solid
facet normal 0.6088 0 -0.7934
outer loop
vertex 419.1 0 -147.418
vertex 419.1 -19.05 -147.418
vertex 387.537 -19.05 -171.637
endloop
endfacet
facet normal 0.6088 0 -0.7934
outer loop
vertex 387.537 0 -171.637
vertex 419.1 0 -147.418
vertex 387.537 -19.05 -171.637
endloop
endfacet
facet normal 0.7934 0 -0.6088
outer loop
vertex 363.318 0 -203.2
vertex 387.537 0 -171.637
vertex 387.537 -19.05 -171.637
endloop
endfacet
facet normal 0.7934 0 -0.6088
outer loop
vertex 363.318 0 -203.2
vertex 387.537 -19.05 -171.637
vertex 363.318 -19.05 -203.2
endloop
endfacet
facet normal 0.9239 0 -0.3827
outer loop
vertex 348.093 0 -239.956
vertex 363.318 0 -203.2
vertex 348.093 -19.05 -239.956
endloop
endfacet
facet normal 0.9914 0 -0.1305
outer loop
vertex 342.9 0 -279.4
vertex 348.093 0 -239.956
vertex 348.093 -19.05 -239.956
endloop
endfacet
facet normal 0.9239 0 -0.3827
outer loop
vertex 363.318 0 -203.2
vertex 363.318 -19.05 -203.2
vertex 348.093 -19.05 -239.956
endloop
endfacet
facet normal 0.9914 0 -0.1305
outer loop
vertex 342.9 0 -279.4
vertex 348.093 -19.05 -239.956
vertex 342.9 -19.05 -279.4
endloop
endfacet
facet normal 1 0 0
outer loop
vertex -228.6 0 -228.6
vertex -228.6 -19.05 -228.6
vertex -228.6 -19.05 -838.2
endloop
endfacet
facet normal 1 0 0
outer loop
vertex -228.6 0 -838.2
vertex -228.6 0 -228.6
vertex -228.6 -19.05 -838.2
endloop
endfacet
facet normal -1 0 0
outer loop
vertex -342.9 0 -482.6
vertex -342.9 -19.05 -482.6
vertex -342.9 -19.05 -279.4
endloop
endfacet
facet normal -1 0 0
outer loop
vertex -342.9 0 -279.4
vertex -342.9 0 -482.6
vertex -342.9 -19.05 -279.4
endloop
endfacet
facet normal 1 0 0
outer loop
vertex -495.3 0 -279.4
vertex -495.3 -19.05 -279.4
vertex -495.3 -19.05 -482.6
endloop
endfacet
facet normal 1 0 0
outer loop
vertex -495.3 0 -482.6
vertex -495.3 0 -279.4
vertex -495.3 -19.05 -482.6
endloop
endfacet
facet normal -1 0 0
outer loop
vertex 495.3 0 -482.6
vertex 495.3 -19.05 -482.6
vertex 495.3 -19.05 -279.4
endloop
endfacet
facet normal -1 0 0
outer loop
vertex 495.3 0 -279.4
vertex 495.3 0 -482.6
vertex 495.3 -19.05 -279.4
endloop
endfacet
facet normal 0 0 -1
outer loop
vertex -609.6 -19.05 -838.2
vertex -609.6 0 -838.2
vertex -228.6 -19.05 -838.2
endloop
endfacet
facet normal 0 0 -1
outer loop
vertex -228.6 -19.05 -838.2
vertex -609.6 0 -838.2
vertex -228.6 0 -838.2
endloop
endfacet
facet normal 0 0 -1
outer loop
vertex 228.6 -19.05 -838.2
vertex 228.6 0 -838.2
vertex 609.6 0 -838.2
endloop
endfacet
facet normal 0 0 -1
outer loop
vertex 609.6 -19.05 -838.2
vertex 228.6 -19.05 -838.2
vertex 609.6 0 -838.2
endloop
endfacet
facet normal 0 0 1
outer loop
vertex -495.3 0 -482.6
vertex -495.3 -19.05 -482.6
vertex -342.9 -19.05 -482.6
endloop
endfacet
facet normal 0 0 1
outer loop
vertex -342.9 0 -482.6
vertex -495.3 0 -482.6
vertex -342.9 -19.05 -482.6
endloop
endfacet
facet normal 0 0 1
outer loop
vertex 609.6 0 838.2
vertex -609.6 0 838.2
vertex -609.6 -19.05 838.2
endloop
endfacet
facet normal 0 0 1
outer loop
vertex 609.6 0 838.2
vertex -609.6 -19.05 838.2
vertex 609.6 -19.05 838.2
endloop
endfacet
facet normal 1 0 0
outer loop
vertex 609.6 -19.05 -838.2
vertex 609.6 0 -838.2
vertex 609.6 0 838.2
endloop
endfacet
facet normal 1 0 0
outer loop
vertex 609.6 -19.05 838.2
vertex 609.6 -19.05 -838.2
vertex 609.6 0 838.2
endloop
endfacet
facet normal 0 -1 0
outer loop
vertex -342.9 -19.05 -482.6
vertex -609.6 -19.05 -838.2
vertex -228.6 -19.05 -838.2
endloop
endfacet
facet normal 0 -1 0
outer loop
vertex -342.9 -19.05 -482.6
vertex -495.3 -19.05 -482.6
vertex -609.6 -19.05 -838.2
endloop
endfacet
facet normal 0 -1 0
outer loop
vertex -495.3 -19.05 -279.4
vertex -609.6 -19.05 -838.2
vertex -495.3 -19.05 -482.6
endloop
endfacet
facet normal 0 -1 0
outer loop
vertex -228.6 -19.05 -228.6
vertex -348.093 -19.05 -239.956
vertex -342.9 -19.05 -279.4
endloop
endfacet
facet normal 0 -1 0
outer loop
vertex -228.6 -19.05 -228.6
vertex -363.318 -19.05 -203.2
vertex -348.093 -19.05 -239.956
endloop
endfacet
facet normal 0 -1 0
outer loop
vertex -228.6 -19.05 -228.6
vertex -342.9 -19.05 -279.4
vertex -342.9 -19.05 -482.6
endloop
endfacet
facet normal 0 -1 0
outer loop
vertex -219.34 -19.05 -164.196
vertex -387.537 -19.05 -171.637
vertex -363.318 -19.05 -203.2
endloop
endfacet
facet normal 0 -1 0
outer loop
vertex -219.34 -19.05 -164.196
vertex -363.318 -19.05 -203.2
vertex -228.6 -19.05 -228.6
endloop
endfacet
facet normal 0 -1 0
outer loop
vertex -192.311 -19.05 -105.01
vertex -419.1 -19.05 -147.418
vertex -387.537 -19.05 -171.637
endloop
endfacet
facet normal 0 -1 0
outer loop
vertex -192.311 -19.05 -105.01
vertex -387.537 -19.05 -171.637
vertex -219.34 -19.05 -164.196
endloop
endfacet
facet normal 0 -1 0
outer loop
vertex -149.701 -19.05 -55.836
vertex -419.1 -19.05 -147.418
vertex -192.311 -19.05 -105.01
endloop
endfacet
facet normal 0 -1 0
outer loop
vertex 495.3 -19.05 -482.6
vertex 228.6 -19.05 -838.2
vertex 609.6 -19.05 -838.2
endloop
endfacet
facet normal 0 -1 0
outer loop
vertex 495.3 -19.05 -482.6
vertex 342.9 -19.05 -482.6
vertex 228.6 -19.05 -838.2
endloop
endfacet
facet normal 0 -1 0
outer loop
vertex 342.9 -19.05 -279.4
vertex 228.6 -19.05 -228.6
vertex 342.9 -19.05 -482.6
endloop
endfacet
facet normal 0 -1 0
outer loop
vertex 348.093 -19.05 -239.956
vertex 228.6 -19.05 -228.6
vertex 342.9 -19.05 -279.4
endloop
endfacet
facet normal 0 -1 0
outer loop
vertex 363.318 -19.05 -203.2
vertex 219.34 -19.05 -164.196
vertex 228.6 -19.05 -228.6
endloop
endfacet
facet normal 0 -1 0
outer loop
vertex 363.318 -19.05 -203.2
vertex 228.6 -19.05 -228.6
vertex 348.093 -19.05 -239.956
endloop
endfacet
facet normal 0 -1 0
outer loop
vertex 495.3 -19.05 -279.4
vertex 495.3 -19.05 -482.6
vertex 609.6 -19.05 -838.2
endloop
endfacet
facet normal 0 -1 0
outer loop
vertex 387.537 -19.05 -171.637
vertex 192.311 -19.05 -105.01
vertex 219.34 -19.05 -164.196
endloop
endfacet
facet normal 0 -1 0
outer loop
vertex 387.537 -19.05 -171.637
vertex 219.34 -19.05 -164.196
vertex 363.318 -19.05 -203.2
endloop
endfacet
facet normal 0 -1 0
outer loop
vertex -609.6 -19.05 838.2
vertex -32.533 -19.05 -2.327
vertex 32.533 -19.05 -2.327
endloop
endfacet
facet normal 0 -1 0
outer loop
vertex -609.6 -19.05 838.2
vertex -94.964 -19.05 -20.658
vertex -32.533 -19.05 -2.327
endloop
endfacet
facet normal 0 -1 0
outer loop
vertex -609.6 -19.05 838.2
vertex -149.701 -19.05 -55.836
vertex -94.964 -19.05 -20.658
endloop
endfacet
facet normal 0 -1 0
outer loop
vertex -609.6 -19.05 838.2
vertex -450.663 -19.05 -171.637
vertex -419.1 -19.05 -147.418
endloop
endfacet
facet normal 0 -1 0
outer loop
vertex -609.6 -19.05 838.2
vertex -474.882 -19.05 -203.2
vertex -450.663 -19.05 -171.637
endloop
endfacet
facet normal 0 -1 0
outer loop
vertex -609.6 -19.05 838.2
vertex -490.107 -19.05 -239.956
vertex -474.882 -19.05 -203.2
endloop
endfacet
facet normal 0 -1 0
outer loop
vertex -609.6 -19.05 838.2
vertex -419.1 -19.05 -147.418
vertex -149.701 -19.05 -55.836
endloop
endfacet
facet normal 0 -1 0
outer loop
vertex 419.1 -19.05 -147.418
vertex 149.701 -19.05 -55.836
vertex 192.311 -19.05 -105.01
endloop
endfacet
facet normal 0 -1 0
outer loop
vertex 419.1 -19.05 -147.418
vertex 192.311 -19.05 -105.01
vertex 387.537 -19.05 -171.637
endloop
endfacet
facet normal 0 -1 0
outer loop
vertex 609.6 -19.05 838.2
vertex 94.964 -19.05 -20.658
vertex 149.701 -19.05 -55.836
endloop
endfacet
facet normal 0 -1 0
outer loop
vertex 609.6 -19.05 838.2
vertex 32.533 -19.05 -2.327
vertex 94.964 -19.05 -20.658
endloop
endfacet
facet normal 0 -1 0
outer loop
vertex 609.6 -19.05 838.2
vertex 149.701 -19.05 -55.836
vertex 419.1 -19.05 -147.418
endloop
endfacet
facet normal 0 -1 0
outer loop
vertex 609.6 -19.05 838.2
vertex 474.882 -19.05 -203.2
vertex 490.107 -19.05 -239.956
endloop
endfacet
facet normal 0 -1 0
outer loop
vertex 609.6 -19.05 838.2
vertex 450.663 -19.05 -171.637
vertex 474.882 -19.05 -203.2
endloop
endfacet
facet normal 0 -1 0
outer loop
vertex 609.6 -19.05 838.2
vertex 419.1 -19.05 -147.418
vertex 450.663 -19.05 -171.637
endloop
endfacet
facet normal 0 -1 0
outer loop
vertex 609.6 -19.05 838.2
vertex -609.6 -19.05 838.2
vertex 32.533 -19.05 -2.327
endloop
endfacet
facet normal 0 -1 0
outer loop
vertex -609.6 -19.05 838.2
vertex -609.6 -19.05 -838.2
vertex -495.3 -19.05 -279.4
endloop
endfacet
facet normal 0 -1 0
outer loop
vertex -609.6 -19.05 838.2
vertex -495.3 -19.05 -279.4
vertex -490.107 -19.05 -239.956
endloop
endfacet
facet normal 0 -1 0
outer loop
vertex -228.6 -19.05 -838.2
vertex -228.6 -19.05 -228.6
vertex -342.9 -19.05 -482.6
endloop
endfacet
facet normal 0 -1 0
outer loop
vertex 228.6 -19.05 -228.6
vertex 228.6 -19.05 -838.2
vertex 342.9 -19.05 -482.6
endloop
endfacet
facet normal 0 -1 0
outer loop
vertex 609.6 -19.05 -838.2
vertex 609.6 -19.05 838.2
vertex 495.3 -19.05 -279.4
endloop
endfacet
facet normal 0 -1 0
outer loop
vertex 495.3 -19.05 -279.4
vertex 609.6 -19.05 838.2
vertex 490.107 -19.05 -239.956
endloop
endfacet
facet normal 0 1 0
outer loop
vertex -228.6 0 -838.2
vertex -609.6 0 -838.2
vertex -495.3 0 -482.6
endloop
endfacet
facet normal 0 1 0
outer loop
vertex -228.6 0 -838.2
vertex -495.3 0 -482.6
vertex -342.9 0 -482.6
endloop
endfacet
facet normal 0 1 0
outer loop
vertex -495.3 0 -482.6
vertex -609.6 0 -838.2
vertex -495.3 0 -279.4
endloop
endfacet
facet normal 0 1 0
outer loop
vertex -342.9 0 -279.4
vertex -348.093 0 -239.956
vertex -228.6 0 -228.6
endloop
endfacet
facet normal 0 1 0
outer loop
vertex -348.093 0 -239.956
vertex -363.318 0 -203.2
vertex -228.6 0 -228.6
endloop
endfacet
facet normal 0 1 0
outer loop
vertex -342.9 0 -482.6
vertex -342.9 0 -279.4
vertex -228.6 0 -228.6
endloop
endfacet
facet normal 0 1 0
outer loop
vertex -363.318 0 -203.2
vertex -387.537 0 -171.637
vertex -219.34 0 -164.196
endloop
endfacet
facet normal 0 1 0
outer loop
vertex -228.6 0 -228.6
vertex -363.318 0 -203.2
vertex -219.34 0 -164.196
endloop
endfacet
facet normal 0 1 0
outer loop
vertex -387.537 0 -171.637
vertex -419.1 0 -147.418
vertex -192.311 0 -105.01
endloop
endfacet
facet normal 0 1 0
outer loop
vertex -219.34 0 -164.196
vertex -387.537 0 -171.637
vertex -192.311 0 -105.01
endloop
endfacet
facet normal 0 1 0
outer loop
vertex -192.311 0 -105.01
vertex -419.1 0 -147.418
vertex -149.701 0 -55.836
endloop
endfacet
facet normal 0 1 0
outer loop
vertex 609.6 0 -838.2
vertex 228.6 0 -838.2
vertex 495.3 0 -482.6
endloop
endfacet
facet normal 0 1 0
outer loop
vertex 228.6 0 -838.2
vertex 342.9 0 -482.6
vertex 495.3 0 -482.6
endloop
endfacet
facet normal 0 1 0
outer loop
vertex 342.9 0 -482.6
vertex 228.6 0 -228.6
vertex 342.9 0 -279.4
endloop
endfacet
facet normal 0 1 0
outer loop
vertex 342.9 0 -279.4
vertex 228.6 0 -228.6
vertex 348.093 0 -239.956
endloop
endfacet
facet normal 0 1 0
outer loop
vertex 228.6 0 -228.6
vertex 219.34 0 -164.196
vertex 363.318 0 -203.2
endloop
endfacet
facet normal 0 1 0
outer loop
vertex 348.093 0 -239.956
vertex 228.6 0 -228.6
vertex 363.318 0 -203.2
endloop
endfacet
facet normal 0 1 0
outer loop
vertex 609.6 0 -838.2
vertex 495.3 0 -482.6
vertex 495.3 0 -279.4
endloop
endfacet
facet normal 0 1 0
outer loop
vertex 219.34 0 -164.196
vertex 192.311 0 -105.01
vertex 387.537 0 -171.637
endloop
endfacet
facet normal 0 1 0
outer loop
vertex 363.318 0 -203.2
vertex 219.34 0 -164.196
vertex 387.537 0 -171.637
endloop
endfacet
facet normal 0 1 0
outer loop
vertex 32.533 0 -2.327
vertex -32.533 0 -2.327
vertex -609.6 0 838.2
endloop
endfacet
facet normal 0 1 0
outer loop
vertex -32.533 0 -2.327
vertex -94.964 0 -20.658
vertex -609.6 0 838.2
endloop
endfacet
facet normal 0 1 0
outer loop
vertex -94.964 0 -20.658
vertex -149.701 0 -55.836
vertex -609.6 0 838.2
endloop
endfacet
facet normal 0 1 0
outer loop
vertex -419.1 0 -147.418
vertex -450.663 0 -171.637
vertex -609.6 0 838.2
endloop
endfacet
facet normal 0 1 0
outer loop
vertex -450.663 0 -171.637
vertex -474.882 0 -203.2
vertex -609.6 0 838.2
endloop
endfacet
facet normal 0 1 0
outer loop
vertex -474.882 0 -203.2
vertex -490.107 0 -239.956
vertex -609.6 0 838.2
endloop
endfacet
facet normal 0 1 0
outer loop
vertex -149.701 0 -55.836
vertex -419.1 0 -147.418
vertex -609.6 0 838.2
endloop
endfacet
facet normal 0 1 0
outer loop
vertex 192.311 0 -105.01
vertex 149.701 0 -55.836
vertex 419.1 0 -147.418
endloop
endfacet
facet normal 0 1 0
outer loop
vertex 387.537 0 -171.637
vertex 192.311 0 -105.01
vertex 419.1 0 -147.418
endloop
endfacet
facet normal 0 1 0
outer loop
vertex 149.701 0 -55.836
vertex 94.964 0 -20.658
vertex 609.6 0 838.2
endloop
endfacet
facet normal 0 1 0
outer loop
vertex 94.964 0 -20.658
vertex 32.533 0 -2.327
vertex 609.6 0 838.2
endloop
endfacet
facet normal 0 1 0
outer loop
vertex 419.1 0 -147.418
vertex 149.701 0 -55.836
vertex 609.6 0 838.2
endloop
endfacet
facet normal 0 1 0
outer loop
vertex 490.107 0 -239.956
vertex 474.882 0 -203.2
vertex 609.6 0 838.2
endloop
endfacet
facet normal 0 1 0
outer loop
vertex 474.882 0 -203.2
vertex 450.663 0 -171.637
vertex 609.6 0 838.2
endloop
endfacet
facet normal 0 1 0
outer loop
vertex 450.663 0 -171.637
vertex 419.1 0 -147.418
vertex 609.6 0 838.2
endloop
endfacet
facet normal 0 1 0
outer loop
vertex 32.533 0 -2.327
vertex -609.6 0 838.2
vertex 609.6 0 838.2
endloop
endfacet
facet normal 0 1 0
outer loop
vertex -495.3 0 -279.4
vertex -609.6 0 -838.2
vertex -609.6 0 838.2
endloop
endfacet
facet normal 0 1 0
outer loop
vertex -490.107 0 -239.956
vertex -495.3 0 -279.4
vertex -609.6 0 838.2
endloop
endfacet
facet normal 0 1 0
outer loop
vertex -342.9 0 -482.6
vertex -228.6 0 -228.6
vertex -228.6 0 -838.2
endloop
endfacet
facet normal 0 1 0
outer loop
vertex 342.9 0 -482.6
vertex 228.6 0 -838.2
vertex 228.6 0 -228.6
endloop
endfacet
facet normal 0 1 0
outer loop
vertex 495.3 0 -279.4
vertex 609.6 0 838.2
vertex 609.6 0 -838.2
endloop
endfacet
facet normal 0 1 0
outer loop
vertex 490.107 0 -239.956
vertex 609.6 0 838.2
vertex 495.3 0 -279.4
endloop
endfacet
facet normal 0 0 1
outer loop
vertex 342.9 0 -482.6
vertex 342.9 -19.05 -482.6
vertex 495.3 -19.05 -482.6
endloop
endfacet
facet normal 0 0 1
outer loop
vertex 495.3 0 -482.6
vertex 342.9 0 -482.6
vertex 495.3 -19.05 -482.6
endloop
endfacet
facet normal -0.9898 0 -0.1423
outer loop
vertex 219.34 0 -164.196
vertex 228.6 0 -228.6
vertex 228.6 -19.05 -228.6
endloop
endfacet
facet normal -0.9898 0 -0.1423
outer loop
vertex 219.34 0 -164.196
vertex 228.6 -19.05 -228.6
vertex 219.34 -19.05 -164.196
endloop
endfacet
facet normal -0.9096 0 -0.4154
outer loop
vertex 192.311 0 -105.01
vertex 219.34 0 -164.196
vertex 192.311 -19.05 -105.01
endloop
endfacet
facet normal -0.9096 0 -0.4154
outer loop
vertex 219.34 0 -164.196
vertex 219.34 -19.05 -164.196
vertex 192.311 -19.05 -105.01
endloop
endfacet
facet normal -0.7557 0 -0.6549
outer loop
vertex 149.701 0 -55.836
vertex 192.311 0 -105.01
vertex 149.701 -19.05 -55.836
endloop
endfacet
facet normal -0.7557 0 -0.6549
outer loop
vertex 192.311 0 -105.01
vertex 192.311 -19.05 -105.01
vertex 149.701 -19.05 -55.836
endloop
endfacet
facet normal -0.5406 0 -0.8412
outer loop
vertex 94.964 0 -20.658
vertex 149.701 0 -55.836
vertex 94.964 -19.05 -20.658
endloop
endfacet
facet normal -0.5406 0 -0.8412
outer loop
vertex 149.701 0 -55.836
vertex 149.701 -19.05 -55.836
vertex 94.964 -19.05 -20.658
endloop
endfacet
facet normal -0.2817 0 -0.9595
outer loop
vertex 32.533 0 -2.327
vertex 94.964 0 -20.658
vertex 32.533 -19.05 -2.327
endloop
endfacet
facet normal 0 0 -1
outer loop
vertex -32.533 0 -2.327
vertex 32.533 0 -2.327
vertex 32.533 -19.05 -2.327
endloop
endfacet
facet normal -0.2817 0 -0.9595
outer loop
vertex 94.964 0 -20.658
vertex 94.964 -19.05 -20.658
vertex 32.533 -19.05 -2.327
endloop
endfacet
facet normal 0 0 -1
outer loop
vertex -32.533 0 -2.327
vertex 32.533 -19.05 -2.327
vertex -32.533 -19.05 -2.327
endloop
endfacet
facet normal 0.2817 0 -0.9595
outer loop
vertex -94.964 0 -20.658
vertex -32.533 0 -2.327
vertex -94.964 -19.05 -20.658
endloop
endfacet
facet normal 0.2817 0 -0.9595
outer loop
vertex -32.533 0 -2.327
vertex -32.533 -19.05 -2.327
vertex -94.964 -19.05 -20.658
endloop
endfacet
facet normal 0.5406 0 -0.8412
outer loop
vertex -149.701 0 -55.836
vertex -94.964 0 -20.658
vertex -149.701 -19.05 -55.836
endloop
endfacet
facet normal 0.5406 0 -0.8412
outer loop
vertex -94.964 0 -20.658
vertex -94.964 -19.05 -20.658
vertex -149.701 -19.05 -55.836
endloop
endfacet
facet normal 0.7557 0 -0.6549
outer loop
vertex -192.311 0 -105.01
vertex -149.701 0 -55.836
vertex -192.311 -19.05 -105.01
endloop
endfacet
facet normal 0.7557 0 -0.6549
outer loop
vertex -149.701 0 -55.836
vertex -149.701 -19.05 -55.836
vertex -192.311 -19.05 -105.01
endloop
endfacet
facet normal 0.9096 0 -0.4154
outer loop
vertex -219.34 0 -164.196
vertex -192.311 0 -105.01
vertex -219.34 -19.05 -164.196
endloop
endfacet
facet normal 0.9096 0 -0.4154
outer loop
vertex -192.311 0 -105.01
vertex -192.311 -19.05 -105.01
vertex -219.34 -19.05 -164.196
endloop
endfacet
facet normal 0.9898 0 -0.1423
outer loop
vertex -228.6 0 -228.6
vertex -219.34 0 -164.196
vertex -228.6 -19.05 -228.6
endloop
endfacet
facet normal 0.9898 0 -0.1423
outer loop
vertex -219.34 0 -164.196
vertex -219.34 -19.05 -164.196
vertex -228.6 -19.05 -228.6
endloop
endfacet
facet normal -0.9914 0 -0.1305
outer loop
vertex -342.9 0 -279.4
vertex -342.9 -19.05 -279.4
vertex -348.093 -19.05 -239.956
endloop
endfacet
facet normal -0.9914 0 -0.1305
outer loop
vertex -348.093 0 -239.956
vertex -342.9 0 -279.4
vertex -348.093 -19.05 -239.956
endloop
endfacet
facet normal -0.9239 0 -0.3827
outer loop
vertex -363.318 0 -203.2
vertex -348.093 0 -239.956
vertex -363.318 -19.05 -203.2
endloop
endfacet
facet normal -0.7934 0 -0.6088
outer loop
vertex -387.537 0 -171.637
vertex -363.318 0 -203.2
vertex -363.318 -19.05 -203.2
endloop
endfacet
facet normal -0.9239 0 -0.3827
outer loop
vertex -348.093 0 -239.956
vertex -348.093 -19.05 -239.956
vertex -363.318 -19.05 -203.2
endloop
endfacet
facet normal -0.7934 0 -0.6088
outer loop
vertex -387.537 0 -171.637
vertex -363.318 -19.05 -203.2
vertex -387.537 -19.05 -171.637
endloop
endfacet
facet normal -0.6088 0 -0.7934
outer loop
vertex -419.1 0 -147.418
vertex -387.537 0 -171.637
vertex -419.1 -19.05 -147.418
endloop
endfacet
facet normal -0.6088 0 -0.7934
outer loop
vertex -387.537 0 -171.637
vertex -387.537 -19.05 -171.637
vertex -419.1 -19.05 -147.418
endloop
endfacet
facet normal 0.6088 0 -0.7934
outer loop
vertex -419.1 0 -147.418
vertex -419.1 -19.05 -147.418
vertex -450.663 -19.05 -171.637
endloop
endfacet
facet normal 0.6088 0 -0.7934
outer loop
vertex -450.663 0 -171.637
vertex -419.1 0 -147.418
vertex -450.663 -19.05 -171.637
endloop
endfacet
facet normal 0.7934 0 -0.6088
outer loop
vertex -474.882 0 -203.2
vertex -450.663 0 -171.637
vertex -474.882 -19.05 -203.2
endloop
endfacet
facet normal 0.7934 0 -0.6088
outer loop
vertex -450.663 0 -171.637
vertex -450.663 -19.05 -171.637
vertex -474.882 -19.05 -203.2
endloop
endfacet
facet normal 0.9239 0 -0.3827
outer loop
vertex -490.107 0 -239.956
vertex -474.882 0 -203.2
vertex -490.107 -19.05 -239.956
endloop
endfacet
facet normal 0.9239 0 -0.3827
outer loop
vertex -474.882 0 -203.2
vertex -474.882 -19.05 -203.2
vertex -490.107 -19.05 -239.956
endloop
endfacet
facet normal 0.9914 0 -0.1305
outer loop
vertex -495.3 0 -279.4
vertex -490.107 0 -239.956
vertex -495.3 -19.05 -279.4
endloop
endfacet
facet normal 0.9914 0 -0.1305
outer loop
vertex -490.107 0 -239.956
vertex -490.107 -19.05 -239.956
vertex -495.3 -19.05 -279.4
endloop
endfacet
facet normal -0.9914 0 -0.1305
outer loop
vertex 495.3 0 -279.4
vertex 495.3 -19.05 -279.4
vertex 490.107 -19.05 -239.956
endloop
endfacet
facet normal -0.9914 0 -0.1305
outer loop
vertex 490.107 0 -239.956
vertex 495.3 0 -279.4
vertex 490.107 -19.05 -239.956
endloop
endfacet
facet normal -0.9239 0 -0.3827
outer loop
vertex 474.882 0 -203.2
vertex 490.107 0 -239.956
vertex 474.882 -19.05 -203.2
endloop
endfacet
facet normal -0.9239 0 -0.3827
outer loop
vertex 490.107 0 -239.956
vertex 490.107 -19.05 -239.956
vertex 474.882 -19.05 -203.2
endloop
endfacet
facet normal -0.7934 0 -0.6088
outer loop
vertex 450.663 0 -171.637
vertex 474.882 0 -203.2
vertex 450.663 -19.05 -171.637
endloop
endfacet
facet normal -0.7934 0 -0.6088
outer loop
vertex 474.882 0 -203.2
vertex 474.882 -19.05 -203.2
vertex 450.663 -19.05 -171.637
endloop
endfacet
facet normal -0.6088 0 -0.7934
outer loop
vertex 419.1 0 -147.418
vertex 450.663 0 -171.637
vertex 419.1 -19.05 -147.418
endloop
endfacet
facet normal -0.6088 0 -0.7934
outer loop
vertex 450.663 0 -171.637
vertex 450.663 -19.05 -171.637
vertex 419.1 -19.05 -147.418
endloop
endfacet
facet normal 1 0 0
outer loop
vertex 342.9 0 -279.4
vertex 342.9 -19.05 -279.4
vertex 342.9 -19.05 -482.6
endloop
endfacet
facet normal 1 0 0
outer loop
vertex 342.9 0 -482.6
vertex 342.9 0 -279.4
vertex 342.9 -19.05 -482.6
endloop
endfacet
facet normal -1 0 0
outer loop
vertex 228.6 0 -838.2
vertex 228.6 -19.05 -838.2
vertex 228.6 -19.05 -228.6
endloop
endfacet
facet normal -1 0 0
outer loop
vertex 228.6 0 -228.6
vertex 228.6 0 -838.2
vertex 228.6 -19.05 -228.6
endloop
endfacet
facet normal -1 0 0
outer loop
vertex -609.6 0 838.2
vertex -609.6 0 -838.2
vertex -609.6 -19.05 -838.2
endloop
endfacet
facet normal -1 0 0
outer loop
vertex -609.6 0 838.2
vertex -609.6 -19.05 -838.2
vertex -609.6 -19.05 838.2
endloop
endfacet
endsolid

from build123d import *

# Parameters (mm, degrees)
F0_W     = 1219.2
F0_H     = 1676.4
F1_DEPTH = 19.05
F3_DEPTH = 19.051
F5_DEPTH = 19.051


with BuildPart() as f1:
    # F0 (on Front) → F1 (new body)
    with BuildSketch(Plane.XZ):
        Rectangle(F0_W, F0_H)
    extrude(amount=F1_DEPTH)

    # F2 (on face) → F3 (cut, through all)
    with BuildSketch(Plane.XZ.offset(19.05)):
        with BuildLine():
            Line((-228.6, -228.6), (-228.6, -838.2))
            Line((-228.6, -838.2), (228.6, -838.2))
            Line((228.6, -838.2), (228.6, -228.6))
            ThreePointArc((228.6, -228.6), (0, 0), (-228.6, -228.6))
        make_face()
    extrude(amount=-F3_DEPTH, mode=Mode.SUBTRACT)

    # F4 (on face) → F5 (cut, through all)
    with BuildSketch(Plane.XZ.offset(19.05)):
        with BuildLine():
            Line((-495.3, -482.6), (-342.9, -482.6))
            Line((-342.9, -482.6), (-342.9, -279.4))
            ThreePointArc((-342.9, -279.4), (-363.317728, -203.2), (-419.1, -147.417728))
            ThreePointArc((-419.1, -147.417728), (-474.882272, -203.2), (-495.3, -279.4))
            Line((-495.3, -279.4), (-495.3, -482.6))
        make_face()
        with BuildLine():
            ThreePointArc((419.1, -147.417728), (363.317728, -203.2), (342.9, -279.4))
            Line((342.9, -279.4), (342.9, -482.6))
            Line((342.9, -482.6), (495.3, -482.6))
            Line((495.3, -482.6), (495.3, -279.4))
            ThreePointArc((495.3, -279.4), (474.882272, -203.2), (419.1, -147.417728))
        make_face()
    extrude(amount=-F5_DEPTH, mode=Mode.SUBTRACT)


solid = f1.part
